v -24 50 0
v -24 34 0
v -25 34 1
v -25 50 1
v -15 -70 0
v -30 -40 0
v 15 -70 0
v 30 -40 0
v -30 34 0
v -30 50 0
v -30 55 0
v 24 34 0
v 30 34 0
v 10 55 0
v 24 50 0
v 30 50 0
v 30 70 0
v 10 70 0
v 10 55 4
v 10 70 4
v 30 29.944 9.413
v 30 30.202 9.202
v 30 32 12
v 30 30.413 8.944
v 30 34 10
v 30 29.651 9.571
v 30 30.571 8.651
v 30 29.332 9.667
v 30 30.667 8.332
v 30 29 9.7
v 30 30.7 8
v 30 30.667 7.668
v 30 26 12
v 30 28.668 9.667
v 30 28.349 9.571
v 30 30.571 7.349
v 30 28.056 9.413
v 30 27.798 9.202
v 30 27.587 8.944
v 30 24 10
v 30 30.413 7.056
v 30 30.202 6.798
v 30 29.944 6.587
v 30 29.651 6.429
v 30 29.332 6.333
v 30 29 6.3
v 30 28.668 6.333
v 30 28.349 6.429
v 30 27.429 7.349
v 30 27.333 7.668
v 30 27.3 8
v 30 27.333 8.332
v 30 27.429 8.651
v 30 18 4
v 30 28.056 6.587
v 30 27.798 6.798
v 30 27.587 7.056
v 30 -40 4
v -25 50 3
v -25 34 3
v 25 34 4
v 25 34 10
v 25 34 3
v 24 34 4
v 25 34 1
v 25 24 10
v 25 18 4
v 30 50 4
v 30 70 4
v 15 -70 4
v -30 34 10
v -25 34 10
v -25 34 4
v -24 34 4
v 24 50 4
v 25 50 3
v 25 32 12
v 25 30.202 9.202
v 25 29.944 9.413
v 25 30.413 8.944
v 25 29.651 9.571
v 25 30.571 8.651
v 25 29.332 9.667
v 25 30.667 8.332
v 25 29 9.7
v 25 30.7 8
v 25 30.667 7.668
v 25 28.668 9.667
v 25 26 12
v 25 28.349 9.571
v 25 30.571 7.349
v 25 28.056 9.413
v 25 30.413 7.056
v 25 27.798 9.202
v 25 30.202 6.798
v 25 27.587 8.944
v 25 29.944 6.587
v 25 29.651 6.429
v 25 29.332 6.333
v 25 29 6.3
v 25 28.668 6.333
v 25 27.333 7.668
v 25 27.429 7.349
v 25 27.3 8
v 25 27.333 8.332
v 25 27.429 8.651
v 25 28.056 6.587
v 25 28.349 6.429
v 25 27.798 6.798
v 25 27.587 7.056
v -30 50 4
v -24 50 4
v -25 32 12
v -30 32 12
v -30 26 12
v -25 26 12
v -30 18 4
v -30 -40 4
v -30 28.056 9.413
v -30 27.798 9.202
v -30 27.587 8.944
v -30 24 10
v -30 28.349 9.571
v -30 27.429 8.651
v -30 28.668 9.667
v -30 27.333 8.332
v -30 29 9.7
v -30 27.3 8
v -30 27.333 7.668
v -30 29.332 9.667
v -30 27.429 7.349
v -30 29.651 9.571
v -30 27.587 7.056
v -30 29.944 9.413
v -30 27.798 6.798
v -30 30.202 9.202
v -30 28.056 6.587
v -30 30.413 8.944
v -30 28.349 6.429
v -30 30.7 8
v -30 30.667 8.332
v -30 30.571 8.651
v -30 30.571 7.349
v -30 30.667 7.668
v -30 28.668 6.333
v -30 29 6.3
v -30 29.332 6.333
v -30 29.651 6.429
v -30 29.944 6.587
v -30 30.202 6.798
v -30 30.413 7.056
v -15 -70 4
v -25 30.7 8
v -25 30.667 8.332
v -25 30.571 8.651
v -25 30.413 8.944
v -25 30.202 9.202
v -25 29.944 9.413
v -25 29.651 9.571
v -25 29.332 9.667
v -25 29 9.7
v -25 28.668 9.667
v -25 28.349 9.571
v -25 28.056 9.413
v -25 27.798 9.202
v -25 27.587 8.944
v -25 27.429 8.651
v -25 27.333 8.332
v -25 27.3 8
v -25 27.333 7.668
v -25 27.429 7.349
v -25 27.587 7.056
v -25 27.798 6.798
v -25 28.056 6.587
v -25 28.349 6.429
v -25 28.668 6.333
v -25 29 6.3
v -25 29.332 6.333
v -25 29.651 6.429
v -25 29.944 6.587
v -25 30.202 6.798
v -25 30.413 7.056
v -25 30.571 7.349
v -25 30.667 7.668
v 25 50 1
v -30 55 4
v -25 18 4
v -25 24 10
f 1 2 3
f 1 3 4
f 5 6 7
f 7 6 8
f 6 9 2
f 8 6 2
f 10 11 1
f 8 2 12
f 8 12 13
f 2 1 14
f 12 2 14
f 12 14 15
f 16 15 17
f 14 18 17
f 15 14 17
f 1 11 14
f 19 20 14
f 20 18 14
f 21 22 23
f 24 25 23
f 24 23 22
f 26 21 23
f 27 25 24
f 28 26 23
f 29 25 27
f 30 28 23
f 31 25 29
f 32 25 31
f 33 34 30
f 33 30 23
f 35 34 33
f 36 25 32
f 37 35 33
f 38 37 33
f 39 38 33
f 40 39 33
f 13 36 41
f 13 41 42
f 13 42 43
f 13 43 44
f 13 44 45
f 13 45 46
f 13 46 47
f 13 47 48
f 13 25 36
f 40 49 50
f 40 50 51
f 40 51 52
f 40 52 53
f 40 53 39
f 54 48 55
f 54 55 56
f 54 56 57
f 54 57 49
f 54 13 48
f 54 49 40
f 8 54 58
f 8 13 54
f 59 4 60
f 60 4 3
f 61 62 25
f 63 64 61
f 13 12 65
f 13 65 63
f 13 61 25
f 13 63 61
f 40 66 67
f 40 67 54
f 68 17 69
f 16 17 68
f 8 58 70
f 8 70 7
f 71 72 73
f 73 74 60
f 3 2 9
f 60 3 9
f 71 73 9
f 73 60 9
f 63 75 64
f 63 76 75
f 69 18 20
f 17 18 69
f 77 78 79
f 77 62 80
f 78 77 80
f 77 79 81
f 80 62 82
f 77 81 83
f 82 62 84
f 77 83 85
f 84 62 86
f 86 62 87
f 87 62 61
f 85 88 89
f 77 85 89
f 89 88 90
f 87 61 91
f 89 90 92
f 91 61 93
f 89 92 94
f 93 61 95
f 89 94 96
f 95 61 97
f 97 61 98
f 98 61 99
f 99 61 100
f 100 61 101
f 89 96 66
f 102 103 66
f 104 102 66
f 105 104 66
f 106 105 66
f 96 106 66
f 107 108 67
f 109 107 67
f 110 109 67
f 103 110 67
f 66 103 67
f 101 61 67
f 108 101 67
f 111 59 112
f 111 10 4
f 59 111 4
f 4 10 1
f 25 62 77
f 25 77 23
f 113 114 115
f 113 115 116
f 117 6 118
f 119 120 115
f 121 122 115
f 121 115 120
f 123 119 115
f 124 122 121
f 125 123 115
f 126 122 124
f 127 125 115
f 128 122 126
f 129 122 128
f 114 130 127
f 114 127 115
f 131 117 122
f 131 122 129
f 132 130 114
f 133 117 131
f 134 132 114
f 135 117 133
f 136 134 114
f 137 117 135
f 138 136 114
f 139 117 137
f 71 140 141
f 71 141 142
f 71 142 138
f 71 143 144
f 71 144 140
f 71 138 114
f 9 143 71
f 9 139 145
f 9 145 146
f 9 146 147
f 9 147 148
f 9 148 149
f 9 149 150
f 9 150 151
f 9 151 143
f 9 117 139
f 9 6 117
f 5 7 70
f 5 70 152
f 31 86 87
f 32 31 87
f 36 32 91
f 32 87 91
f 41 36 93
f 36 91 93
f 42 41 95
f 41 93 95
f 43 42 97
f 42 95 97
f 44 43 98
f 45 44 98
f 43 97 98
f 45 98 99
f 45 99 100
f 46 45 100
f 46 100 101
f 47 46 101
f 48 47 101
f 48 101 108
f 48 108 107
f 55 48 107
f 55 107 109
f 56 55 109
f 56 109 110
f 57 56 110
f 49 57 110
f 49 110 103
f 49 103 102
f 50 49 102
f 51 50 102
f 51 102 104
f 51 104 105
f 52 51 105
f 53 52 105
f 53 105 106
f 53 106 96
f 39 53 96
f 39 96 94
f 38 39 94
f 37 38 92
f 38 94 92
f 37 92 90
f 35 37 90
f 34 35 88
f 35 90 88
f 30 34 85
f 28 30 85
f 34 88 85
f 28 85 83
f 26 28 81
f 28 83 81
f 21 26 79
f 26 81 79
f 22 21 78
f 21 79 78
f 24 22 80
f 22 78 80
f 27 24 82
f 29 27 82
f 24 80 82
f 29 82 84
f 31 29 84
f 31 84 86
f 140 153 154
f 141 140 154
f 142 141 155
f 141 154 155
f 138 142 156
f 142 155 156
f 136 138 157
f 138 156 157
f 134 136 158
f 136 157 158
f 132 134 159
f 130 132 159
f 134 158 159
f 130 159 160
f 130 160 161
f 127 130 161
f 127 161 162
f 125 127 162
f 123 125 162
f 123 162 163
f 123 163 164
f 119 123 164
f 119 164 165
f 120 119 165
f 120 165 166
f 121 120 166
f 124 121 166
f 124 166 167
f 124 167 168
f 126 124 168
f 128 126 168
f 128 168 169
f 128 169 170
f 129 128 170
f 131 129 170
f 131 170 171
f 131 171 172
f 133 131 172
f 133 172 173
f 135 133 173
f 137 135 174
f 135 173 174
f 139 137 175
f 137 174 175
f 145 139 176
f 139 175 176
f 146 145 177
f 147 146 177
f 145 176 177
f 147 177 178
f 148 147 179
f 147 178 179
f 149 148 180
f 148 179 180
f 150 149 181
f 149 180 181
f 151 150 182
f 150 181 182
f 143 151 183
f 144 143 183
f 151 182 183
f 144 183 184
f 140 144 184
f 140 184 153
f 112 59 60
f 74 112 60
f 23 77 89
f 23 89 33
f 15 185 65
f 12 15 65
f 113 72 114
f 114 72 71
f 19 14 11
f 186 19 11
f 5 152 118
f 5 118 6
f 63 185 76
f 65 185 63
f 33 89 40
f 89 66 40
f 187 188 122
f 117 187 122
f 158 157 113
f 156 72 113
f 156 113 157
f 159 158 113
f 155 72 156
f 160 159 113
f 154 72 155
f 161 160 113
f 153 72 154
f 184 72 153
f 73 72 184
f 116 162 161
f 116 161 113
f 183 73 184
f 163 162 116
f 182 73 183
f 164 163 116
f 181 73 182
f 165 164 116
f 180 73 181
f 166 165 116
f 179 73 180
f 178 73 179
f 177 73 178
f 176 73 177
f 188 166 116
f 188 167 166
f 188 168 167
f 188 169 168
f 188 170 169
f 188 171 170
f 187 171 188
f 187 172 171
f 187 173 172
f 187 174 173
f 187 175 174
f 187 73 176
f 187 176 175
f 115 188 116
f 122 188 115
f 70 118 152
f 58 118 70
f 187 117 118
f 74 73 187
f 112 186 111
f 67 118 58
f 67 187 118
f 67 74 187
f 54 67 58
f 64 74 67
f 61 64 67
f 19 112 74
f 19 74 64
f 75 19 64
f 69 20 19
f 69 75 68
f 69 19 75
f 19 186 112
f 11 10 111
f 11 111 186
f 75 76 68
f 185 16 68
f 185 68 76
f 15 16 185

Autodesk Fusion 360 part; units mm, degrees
sketch "Sketch1" plane through (0, 0, 0) normal (0, 0, 1) x (1, 0, 0)
  line L0 (30, -70) -> (-30, -70)
  line L1 (-30, -70) -> (-30, 70)
  line L2 (-30, 70) -> (30, 70)
  line L3 (30, 70) -> (30, -70)
  line L4 (30, -70) -> (-30, 70) construction
  line L5 (-30, -70) -> (30, 70) construction
  line L6 (-30, 70) -> (10, 70)
  line L7 (10, 70) -> (10, 55)
  line L8 (10, 55) -> (-30, 55)
  line L9 (-30, 55) -> (-30, 70)
  line L10 (-30, 50) -> (-25, 50)
  line L11 (-25, 50) -> (-25, 34)
  line L12 (-25, 34) -> (-30, 34)
  line L13 (-30, 34) -> (-30, 50)
  line L14 (0, 1.75) -> (0, 22.5)
  line L15 (30, 50) -> (25, 50)
  line L16 (25, 50) -> (25, 34)
  line L17 (25, 34) -> (30, 34)
  line L18 (-30, 34) -> (-25, 34)
  line L19 (-25, 34) -> (-25, 24)
  line L20 (-25, 24) -> (-30, 24)
  line L21 (-30, 24) -> (-30, 34)
  line L22 (25, 34) -> (25, 24)
  line L23 (25, 24) -> (30, 24)
  line L24 (25, 34) -> (30, 34)
  dimension "d1" = 60
  dimension "d2" = 140
  dimension "d3" = 40
  dimension "d4" = 15
  dimension "d5" = 5
  dimension "d6" = 16
  dimension "d7" = 5
  dimension "d8" = 5
  dimension "d9" = 10
extrude "Extrude1" add sketch "Sketch1" along normal blind 4 contours L0 L1 L2 L3 L7 L8 L10 L11 L15 L16 L19 L20 L22 L23
extrude "Extrude2" add sketch "Sketch1" along normal blind 12 contours L3 L17 L22 L23 L24 | L1 L12 L18 L19 L20 L21
chamfer "Chamfer1" distance 15 distance2 30 1 edges at (30, -70, 2) measured on face at (10, -70, 1.3333)
chamfer "Chamfer1" distance 30 distance2 15 1 edges at (-30, -70, 2) measured on face at (-30, 30.6667, 5.3333)
chamfer "Chamfer1" distance 1 distance2 1 4 edges at (-25, 42, 0) (-25, 42, 4) (25, 42, 4) (25, 42, 0) measured on face at (-25, 44.6667, 1.3333) measured on face at (-8.3333, -38.6667, 4) measured on face at (-8.3333, -38.6667, 4) measured on face at (-8.3333, -35.3333, 0)
chamfer "Chamfer1" distance 6 distance2 6 2 edges at (27.5, 24, 4) (-27.5, 24, 4) measured on face at (-8.3333, -38.6667, 4) measured on face at (-8.3333, -38.6667, 4)
chamfer "Chamfer1" distance 2 distance2 2 4 edges at (27.5, 24, 12) (27.5, 34, 12) (-27.5, 24, 12) (-27.5, 34, 12) measured on face at (28.3333, 30.6667, 12) measured on face at (28.3333, 30.6667, 12) measured on face at (-28.3333, 30.6667, 12) measured on face at (-28.3333, 30.6667, 12)
sketch "Sketch2" plane through (0, 0, 0) normal (1, 0, 0) x (0, 1, 0)
  circle A0 centre (29, 8) radius 1.7
  dimension "d22" = 3.4
  dimension "d23" = 29
  dimension "d24" = 8
extrude "Extrude3" cut sketch "Sketch2" along normal mid plane 100
